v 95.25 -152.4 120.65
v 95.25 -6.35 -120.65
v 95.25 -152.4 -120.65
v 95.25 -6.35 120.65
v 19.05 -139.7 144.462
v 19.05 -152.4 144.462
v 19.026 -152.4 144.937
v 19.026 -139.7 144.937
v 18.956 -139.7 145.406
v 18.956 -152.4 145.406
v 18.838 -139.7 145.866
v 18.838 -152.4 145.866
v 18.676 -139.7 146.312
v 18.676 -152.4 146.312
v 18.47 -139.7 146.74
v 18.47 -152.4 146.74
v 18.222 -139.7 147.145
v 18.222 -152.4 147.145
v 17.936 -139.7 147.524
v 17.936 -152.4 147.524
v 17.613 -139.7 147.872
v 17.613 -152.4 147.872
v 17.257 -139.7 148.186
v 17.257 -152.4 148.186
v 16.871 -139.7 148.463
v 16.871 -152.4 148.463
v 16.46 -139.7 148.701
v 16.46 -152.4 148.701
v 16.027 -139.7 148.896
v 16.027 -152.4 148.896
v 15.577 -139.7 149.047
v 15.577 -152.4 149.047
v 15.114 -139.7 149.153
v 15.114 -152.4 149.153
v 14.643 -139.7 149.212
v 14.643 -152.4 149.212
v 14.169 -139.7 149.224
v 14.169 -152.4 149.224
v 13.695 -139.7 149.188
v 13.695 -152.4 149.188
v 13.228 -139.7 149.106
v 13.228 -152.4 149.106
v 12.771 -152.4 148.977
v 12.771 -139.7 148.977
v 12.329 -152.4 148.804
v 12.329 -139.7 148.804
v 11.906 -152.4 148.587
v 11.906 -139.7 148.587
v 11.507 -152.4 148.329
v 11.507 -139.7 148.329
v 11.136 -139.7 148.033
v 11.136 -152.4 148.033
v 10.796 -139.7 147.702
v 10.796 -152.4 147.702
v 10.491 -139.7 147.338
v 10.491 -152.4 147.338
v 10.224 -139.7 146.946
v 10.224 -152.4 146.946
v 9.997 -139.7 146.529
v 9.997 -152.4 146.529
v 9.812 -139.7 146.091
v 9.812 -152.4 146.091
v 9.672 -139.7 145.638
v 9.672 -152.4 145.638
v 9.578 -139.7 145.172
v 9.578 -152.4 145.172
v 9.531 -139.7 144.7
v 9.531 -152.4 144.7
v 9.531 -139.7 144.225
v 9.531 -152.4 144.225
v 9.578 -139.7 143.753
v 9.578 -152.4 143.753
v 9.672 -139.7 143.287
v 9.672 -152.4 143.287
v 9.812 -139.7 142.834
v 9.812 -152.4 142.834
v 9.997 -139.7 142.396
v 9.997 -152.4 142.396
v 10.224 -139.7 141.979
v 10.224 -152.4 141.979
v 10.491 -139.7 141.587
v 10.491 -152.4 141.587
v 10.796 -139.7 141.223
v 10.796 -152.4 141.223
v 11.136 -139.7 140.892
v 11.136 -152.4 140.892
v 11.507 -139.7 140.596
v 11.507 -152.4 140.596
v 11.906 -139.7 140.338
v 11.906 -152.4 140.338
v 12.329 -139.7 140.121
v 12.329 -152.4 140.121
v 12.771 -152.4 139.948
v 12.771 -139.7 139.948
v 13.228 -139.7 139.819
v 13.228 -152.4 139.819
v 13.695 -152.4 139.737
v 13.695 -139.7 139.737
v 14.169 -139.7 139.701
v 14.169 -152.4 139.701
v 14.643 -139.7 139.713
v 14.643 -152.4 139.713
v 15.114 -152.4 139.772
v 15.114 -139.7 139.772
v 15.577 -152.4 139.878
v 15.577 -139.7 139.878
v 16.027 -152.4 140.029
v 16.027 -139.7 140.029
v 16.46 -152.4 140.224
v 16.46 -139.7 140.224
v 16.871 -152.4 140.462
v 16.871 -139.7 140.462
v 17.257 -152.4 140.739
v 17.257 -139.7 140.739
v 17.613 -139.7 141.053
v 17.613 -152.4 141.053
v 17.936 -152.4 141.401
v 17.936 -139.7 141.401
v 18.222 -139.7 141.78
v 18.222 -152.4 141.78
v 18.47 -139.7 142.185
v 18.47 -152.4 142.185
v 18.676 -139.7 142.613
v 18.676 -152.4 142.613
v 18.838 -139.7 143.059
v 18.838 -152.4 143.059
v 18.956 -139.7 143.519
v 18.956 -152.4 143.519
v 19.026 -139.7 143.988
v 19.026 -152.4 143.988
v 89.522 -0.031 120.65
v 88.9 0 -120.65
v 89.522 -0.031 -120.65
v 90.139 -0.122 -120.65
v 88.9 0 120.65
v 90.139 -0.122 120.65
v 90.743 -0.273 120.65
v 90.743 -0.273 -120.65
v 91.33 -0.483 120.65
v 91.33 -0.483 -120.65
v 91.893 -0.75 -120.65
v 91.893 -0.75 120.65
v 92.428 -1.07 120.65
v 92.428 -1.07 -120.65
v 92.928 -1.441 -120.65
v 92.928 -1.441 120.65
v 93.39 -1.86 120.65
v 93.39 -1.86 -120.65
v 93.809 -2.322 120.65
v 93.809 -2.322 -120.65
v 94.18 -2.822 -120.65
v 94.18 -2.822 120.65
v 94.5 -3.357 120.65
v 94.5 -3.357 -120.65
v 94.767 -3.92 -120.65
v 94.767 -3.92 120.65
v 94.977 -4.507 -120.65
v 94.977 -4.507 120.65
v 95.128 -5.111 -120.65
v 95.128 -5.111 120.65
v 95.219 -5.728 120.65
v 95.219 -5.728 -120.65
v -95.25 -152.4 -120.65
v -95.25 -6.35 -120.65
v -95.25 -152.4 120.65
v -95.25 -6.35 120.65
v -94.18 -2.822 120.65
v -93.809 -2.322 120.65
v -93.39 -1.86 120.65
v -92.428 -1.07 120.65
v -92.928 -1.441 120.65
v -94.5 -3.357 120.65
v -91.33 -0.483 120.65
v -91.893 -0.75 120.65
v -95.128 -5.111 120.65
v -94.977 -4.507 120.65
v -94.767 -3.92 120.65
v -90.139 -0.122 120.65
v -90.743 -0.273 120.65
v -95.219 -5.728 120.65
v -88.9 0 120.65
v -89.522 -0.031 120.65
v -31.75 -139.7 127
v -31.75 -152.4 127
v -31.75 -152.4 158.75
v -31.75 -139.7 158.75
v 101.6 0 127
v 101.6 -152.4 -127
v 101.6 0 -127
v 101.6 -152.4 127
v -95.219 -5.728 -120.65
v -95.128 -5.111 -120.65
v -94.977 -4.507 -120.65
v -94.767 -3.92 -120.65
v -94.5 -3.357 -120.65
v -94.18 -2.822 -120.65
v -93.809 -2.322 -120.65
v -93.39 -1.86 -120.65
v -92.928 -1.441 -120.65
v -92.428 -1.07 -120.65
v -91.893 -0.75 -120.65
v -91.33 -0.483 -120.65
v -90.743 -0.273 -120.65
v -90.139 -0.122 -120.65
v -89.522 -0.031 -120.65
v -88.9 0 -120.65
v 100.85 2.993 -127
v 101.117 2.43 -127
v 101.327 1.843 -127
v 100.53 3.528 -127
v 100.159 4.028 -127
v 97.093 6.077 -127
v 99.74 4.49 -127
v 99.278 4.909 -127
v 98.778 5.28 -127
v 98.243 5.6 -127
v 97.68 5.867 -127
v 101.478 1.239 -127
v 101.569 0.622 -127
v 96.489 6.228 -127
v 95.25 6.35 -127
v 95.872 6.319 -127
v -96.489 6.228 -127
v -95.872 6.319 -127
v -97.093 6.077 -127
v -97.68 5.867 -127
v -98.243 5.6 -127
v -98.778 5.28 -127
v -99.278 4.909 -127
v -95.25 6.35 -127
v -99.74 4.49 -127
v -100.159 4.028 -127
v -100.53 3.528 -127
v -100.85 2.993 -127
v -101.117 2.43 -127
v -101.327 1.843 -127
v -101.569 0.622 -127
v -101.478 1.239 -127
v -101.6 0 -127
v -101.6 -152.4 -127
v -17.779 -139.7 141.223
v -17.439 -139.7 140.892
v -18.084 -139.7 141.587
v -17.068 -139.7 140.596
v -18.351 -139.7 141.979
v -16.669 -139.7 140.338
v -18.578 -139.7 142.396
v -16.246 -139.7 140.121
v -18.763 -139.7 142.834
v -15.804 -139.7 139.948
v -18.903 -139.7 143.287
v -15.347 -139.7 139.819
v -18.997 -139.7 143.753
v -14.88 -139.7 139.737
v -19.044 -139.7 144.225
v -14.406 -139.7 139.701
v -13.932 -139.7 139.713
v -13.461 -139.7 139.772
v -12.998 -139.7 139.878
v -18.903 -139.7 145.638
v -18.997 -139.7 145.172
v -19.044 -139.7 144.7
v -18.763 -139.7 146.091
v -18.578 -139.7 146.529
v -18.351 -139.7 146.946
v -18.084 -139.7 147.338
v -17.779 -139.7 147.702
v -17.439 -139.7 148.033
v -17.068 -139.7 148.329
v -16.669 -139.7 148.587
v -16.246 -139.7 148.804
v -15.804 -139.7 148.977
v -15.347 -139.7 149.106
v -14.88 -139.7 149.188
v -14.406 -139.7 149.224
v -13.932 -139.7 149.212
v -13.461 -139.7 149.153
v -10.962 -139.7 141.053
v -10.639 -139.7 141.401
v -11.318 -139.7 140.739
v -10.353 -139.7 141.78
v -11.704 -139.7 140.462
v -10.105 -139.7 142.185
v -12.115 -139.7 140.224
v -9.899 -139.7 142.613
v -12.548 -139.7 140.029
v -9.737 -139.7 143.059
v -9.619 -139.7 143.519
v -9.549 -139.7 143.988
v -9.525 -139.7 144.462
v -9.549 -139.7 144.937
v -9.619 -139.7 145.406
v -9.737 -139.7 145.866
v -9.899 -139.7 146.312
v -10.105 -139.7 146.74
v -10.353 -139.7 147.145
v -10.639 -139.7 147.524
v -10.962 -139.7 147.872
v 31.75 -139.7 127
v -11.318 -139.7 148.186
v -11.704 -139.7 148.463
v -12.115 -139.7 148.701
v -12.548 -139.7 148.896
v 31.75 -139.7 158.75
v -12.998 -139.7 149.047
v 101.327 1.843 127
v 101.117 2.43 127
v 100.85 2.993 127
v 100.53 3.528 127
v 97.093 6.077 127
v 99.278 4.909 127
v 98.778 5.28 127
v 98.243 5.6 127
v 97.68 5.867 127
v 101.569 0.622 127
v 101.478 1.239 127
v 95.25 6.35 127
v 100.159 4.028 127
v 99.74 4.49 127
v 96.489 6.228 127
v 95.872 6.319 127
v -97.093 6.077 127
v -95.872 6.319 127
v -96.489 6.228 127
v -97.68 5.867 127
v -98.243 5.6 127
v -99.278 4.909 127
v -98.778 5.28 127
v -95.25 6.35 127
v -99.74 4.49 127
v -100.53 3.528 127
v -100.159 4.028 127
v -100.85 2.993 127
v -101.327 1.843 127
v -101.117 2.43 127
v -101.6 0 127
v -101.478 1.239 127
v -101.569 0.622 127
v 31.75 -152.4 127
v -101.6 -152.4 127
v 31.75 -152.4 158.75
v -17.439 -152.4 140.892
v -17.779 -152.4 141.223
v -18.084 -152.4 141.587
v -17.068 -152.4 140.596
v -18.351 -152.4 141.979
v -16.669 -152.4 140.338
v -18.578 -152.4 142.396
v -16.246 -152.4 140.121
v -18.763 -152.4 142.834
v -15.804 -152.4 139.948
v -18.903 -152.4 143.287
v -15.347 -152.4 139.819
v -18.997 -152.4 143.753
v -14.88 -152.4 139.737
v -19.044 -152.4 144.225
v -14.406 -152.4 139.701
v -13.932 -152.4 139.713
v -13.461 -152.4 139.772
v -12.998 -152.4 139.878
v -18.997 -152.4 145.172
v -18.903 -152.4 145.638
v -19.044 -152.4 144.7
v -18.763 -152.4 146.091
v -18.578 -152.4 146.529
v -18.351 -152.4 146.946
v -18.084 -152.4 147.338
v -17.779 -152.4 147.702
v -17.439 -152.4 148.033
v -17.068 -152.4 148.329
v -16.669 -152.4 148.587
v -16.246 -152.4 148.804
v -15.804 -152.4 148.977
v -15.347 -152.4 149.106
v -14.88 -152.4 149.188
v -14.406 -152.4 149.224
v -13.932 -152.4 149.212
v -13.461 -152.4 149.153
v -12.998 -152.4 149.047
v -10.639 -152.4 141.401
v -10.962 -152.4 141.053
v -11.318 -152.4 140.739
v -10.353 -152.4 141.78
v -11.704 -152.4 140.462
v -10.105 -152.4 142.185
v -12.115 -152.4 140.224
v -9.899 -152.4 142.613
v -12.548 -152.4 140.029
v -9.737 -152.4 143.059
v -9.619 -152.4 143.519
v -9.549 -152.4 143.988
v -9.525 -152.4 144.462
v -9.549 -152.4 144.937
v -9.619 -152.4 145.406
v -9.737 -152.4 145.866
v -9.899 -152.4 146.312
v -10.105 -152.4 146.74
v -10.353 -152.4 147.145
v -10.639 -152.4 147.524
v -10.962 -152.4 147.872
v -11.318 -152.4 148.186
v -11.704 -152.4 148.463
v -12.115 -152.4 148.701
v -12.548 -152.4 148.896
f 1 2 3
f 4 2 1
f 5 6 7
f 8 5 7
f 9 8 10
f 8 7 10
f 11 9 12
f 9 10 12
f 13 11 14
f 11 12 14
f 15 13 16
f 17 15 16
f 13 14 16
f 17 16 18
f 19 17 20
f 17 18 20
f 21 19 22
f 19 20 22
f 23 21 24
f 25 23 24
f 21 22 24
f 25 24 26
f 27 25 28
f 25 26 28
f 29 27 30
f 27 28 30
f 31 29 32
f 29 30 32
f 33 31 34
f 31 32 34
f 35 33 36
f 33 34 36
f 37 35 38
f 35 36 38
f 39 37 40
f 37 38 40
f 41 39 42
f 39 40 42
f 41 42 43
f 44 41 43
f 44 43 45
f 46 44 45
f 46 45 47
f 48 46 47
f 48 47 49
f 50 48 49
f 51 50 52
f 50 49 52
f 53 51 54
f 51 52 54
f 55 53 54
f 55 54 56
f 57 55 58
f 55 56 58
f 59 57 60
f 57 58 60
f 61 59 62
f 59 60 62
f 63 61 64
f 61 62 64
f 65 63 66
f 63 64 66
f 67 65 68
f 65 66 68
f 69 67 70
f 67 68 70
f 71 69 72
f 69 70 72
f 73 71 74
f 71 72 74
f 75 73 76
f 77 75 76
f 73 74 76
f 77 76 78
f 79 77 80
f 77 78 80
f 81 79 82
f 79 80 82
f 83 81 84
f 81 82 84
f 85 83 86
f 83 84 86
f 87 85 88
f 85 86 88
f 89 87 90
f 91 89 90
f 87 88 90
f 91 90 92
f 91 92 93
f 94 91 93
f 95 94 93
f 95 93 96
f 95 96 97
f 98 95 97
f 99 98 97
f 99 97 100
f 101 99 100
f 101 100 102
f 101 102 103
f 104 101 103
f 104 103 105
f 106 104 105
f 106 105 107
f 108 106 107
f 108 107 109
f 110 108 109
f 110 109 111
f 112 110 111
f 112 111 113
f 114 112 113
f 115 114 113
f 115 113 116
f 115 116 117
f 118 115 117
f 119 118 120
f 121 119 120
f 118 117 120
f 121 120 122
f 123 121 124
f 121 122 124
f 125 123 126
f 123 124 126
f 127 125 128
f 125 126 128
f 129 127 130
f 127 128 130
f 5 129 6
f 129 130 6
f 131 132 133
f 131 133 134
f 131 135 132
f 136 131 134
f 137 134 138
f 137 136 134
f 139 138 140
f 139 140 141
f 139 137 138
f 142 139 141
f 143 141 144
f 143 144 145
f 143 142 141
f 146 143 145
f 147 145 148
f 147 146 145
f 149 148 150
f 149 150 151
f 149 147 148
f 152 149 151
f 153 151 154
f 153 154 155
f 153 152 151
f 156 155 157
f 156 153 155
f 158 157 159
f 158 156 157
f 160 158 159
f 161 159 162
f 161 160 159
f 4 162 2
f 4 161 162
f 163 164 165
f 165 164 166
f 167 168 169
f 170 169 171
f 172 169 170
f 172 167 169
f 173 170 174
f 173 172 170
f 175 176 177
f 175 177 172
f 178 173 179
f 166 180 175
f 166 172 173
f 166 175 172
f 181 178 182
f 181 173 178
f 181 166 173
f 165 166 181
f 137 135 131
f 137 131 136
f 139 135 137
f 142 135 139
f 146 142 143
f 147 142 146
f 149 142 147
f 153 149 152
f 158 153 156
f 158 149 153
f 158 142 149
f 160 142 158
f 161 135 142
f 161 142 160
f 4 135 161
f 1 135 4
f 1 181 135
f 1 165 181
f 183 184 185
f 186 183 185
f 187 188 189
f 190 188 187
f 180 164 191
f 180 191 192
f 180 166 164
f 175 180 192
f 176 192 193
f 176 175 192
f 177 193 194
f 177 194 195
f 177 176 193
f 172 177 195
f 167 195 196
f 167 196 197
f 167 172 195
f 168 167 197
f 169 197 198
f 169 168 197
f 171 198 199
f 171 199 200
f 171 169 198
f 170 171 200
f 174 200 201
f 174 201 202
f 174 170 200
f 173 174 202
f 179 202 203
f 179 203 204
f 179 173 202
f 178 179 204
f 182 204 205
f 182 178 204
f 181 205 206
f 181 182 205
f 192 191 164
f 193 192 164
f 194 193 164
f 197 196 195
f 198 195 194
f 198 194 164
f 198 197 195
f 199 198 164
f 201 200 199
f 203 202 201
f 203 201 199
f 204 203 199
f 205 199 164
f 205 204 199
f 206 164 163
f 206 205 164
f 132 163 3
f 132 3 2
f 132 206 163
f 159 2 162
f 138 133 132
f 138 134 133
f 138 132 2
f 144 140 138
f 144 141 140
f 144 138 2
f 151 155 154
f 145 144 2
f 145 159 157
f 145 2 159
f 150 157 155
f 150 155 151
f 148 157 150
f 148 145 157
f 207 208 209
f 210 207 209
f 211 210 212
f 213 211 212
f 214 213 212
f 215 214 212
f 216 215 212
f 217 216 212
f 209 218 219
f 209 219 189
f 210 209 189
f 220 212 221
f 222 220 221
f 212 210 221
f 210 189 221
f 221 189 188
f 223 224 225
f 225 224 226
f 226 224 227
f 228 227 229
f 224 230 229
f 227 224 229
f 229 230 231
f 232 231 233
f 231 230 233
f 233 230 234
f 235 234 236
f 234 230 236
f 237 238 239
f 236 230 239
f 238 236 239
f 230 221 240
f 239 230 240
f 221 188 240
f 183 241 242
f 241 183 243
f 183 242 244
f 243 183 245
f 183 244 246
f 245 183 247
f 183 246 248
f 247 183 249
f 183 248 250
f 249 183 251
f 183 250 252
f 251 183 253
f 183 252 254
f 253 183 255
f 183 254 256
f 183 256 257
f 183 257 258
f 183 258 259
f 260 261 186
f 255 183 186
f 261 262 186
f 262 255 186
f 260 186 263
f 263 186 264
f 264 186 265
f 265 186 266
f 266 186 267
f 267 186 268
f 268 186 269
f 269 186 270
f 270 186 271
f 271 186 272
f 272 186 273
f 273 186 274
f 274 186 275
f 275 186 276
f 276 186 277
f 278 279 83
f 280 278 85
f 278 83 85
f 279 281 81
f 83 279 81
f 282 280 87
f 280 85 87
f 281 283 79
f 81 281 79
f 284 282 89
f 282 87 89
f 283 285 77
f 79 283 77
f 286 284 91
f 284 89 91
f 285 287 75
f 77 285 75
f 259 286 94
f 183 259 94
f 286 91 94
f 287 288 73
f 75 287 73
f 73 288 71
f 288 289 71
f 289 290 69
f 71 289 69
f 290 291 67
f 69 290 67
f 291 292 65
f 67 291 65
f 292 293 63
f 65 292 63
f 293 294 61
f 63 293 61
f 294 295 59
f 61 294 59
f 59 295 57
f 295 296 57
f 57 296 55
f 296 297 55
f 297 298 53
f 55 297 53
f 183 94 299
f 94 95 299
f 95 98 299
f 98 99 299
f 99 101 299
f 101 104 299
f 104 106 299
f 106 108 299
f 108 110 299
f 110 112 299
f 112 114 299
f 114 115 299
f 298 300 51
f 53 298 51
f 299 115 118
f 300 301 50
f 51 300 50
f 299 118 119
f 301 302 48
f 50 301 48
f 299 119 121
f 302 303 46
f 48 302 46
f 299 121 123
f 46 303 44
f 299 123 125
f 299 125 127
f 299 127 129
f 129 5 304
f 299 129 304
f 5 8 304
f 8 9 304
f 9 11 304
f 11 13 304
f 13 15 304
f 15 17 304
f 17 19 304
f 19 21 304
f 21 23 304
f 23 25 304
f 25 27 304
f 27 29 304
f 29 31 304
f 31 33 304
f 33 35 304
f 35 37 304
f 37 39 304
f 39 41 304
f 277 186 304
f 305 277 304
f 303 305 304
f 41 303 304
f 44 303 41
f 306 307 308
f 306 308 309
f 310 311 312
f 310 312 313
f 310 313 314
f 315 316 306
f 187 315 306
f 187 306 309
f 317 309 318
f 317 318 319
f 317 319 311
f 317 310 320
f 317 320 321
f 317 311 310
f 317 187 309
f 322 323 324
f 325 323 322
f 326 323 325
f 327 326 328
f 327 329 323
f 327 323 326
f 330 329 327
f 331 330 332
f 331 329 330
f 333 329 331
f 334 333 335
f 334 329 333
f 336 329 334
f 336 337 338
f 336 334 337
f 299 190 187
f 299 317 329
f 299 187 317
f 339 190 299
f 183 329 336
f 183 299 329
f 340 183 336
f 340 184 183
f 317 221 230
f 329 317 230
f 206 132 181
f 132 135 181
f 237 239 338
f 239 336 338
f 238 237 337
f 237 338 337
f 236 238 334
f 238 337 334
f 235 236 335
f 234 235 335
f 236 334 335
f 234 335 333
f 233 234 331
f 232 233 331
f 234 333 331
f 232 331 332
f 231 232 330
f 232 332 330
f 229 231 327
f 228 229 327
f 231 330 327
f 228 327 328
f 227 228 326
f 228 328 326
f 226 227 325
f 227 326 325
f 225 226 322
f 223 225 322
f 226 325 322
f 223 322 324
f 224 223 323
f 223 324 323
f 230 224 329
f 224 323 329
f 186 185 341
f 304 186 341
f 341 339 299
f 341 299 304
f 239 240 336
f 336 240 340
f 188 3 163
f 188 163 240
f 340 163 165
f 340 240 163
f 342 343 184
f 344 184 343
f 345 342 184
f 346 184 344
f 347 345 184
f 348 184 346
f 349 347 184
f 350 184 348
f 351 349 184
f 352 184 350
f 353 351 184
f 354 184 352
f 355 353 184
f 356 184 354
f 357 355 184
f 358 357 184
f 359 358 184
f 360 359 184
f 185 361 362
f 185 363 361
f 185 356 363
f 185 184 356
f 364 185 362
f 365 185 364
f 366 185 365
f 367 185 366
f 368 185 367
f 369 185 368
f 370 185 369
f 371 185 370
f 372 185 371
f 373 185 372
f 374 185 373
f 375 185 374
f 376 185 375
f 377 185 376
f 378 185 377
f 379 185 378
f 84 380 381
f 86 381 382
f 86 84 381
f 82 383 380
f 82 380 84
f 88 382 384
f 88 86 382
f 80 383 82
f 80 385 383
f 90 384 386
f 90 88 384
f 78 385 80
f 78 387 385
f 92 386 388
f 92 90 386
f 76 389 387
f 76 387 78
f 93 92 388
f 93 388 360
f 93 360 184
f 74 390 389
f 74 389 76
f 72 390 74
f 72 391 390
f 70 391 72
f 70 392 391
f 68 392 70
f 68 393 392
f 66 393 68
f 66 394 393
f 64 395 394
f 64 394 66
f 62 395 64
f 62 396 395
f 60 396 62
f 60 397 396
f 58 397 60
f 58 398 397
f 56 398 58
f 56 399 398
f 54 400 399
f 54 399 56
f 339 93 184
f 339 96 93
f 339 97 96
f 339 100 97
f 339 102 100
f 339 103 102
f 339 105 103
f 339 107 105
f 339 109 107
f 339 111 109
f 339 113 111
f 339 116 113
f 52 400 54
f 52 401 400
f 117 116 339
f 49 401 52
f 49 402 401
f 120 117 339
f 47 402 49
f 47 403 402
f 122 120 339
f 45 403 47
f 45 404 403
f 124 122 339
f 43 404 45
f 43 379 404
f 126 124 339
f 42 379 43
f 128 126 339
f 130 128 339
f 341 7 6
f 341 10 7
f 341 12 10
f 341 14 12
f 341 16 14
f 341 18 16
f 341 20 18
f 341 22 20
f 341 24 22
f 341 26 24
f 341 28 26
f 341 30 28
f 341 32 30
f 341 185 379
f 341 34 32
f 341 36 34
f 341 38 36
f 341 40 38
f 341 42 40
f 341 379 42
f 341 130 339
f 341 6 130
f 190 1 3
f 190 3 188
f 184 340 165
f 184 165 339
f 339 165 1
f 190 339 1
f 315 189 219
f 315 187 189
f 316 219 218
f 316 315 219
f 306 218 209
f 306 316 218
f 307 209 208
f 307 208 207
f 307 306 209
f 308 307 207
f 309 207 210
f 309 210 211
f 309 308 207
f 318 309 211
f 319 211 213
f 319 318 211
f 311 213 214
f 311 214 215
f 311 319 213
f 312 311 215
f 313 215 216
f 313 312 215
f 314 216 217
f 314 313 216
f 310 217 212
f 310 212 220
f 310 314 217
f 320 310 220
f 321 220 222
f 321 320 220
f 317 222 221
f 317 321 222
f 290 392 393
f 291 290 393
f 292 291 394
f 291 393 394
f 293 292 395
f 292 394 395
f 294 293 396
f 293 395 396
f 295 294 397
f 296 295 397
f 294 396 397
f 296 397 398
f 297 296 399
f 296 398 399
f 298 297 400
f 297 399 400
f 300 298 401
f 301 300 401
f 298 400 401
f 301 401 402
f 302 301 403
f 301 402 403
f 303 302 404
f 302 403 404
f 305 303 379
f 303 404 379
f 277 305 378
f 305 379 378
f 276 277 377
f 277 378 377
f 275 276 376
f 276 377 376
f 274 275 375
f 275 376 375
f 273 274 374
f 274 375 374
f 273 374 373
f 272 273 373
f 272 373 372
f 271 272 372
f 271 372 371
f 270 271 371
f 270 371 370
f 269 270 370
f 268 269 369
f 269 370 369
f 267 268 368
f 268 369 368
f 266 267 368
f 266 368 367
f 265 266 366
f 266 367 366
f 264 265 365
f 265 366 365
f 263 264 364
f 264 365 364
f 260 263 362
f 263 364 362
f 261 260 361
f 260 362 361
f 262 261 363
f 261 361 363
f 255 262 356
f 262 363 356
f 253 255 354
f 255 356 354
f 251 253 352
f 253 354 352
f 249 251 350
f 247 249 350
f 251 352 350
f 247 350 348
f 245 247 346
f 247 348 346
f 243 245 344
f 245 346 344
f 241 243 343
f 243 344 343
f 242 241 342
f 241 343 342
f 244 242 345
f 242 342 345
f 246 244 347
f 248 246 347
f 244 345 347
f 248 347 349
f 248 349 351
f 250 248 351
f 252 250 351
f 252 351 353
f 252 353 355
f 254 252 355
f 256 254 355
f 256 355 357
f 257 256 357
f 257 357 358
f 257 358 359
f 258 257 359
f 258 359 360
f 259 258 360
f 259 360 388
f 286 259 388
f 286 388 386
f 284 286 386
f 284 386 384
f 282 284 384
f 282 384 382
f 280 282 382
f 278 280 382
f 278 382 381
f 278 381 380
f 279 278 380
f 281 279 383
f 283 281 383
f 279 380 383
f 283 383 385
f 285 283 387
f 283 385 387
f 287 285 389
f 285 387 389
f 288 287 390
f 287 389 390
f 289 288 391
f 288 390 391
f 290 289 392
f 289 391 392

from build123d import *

# Parameters (mm, degrees)
F0_W     = 203.2
F0_H     = 254
F0_W_2   = 190.5
F0_H_2   = 241.3
F1_DEPTH = 152.4
F2_W     = 203.2
F2_H     = 254
F3_DEPTH = 6.35
F4_R     = 6.35
F5_W     = 63.5
F5_H     = 38.1
F5_R     = 4.7625
F6_DEPTH = 12.7


with BuildPart() as f1:
    # F0 (on Front) → F1 (new body)
    with BuildSketch(Plane.XZ):
        Rectangle(F0_W, F0_H)
        Rectangle(F0_W_2, F0_H_2, mode=Mode.SUBTRACT)
    extrude(amount=F1_DEPTH)

    # F2 (on face) → F3 (join)
    with BuildSketch(Plane(origin=(0, 0, 0), x_dir=(-1, 0, 0), z_dir=(0, 1, 0))):
        Rectangle(F2_W, F2_H)
    extrude(amount=F3_DEPTH)

    # F4
    f4_edges = [f1.edges().sort_by_distance(p)[0] for p in [
        (-95.25, 0, 0),
        (95.25, 0, 0),
        (-101.6, 6.35, 0),
        (101.6, 6.35, 0),
    ]]
    fillet(f4_edges, radius=F4_R)

    # F5 (on face) → F6 (join)
    with BuildSketch(Plane.XZ.offset(152.4)):
        with Locations((0, 139.7)):
            Rectangle(F5_W, F5_H)
        with Locations((-14.2875, 144.4625)):
            Circle(F5_R, mode=Mode.SUBTRACT)
        with Locations((14.2875, 144.4625)):
            Circle(F5_R, mode=Mode.SUBTRACT)
    extrude(amount=-F6_DEPTH)


solid = f1.part
